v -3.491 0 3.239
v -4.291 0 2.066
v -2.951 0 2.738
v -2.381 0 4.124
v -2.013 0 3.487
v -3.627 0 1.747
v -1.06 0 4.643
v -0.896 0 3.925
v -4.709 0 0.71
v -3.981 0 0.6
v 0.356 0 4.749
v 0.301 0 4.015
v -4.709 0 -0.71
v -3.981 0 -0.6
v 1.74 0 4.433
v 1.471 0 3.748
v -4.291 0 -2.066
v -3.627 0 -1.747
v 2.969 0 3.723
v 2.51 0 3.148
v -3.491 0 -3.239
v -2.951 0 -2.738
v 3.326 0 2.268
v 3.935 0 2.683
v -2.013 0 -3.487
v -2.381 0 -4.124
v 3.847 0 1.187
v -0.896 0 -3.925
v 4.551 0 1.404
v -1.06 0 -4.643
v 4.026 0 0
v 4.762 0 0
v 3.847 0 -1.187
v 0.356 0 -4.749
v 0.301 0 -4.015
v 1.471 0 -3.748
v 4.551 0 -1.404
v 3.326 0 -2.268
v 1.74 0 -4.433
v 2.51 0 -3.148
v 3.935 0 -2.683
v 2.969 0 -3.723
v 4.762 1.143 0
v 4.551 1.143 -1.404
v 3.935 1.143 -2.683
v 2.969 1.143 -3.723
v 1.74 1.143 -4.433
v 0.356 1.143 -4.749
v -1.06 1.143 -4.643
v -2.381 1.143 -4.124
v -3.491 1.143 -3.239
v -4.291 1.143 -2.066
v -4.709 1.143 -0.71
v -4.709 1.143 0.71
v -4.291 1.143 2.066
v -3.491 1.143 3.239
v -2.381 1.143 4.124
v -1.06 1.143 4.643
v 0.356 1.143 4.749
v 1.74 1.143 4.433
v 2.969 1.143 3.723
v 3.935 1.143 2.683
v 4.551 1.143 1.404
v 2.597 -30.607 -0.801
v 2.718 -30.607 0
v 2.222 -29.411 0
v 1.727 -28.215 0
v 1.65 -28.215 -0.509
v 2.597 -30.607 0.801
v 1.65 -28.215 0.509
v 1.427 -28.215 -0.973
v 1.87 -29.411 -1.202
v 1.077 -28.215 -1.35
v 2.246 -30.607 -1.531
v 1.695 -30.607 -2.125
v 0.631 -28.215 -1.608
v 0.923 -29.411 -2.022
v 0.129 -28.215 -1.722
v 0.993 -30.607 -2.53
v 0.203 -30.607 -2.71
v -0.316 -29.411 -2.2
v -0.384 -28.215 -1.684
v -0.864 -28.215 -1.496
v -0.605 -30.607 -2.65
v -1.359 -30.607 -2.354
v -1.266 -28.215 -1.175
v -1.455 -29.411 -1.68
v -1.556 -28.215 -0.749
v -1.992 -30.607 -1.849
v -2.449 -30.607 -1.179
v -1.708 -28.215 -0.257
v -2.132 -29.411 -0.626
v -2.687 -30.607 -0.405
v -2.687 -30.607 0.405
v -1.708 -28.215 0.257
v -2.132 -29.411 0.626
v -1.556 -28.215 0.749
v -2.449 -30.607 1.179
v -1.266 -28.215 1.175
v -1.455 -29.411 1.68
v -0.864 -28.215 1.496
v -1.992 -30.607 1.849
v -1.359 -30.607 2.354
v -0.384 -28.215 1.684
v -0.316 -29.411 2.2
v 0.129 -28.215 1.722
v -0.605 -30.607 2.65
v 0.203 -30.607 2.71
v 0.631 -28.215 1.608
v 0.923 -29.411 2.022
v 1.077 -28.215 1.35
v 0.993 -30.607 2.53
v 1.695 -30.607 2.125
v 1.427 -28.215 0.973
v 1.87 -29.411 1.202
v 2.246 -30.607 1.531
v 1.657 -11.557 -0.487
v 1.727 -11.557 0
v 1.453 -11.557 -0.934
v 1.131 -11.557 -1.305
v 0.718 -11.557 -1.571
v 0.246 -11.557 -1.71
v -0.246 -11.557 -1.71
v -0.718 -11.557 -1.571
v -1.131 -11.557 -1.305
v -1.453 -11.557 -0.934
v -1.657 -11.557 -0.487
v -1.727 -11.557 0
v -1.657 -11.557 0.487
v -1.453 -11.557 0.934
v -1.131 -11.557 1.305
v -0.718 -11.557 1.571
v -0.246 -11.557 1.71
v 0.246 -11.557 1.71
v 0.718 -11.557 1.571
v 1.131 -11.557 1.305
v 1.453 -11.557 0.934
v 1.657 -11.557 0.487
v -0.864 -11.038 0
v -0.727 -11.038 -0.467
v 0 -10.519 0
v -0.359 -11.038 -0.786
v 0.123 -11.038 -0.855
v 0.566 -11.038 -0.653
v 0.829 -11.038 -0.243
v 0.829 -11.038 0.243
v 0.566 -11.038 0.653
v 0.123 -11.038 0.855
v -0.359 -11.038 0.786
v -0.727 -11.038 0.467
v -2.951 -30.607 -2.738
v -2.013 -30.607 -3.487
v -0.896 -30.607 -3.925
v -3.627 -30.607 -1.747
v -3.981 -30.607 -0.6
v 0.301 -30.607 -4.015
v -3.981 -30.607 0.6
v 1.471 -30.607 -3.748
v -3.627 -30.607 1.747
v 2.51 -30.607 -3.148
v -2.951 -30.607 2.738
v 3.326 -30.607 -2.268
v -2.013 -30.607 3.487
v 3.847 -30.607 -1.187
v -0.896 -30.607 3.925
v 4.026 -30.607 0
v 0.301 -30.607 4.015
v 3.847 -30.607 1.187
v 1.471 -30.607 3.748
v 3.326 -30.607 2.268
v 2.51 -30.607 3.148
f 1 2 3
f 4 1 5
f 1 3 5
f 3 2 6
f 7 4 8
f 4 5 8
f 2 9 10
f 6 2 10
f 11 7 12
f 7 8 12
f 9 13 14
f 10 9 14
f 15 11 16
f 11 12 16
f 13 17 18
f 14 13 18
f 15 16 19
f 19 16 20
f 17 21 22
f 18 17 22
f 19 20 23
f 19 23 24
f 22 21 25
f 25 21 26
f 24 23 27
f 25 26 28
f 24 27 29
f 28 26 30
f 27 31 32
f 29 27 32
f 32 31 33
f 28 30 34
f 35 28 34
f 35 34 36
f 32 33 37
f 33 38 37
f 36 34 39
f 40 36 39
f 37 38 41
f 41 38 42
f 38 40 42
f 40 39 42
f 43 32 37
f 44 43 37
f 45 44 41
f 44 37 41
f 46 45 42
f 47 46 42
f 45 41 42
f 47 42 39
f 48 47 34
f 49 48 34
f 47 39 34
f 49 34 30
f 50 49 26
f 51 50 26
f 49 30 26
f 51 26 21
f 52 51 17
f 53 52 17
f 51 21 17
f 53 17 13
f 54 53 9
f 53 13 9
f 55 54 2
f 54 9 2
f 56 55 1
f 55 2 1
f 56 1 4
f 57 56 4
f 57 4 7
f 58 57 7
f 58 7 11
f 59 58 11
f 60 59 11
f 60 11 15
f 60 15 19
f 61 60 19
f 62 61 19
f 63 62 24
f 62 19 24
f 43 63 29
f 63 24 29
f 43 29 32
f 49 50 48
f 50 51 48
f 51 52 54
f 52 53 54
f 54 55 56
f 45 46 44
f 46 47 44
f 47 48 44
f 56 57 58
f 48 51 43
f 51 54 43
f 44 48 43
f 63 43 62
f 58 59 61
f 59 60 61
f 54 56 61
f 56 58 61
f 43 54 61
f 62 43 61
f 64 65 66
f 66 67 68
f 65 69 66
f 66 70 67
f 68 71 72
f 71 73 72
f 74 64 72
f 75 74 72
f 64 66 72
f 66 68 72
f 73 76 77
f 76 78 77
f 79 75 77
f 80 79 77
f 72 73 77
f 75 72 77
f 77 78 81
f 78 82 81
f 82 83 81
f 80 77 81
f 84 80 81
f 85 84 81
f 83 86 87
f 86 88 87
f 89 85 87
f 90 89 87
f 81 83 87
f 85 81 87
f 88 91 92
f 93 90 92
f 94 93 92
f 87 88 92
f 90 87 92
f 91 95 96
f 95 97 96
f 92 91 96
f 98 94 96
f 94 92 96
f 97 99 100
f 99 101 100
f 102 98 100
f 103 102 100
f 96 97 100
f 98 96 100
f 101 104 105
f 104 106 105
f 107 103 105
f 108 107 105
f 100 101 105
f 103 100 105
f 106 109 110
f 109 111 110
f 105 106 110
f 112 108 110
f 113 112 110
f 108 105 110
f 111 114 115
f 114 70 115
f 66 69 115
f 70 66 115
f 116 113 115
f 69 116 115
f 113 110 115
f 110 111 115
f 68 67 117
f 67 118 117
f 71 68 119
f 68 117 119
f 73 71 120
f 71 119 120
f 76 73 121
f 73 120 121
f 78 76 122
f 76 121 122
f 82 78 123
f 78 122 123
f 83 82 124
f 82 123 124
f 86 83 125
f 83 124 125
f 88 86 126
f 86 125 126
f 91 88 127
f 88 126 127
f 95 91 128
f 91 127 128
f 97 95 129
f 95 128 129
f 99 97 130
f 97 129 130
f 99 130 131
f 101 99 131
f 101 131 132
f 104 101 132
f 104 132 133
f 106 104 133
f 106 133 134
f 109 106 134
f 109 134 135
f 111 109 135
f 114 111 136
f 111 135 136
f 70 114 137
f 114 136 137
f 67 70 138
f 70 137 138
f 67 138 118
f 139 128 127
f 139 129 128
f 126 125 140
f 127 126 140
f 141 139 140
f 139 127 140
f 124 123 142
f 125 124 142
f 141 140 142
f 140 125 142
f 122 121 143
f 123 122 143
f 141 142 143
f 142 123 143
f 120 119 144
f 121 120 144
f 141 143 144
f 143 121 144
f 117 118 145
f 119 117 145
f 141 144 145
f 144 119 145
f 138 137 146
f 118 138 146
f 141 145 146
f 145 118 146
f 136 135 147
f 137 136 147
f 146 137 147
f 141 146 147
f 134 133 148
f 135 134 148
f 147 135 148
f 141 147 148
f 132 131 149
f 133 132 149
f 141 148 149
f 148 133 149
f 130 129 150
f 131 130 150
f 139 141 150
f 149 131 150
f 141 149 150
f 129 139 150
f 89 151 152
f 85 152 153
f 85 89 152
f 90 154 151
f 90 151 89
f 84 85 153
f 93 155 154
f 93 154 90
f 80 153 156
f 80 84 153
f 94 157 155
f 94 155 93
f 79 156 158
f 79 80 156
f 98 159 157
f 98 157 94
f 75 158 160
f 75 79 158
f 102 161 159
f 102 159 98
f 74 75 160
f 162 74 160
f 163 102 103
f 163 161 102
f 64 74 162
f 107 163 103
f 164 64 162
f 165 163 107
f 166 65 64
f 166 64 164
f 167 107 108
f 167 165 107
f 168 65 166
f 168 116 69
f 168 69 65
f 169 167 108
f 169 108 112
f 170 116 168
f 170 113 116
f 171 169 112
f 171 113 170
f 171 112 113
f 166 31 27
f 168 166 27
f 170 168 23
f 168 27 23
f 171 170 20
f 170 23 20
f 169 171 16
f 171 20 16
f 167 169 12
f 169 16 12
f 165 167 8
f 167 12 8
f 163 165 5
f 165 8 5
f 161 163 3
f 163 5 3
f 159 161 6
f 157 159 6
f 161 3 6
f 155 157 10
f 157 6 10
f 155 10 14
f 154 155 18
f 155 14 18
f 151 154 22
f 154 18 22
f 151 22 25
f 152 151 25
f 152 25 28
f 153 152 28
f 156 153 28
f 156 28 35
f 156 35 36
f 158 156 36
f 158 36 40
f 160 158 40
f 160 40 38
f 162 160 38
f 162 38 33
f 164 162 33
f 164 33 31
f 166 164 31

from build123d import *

# Parameters (mm, degrees)
SKETCH1_R                       = 4.7625
BOSS_EXTRUDE1_DEPTH             = 1.143
BOSS_EXTRUDE2_START             = -1.143
SKETCH2_R                       = 4.0259
BOSS_EXTRUDE2_DEPTH             = 31.75
F_8_32_TAPPED_HOLE1_D           = 3.4544
F_8_32_TAPPED_HOLE1_DEPTH       = 19.05
F_8_32_TAPPED_HOLE1_CSINK_D     = 5.4356
F_8_32_TAPPED_HOLE1_CSINK_ANGLE = 45
F_8_32_TAPPED_HOLE1_TIP         = 1.037806461


with BuildPart() as part:
    # Sketch1 → Boss-Extrude1 (new body)
    with BuildSketch(Plane(origin=(0, 0, 0), x_dir=(1, 0, 0), z_dir=(0, 1, 0))):
        Circle(SKETCH1_R)
    extrude(amount=BOSS_EXTRUDE1_DEPTH)

    # Sketch2 → Boss-Extrude2 (add)
    with BuildSketch(Plane.XZ.offset(BOSS_EXTRUDE2_START)):
        Circle(SKETCH2_R)
    extrude(amount=BOSS_EXTRUDE2_DEPTH)

    # #8-32 Tapped Hole1
    with Locations(Plane(origin=(0, -30.607, 0), x_dir=(-1, 0, 0), z_dir=(0, -1, 0))):
        with Locations((0, 0)):
            CounterSinkHole(F_8_32_TAPPED_HOLE1_D / 2, F_8_32_TAPPED_HOLE1_CSINK_D / 2, depth=F_8_32_TAPPED_HOLE1_DEPTH, counter_sink_angle=F_8_32_TAPPED_HOLE1_CSINK_ANGLE)
            with Locations((0, 0, -(F_8_32_TAPPED_HOLE1_DEPTH + F_8_32_TAPPED_HOLE1_TIP / 2))):  # 118° drill point
                Cone(0, F_8_32_TAPPED_HOLE1_D / 2, F_8_32_TAPPED_HOLE1_TIP, mode=Mode.SUBTRACT)


solid = part.part
